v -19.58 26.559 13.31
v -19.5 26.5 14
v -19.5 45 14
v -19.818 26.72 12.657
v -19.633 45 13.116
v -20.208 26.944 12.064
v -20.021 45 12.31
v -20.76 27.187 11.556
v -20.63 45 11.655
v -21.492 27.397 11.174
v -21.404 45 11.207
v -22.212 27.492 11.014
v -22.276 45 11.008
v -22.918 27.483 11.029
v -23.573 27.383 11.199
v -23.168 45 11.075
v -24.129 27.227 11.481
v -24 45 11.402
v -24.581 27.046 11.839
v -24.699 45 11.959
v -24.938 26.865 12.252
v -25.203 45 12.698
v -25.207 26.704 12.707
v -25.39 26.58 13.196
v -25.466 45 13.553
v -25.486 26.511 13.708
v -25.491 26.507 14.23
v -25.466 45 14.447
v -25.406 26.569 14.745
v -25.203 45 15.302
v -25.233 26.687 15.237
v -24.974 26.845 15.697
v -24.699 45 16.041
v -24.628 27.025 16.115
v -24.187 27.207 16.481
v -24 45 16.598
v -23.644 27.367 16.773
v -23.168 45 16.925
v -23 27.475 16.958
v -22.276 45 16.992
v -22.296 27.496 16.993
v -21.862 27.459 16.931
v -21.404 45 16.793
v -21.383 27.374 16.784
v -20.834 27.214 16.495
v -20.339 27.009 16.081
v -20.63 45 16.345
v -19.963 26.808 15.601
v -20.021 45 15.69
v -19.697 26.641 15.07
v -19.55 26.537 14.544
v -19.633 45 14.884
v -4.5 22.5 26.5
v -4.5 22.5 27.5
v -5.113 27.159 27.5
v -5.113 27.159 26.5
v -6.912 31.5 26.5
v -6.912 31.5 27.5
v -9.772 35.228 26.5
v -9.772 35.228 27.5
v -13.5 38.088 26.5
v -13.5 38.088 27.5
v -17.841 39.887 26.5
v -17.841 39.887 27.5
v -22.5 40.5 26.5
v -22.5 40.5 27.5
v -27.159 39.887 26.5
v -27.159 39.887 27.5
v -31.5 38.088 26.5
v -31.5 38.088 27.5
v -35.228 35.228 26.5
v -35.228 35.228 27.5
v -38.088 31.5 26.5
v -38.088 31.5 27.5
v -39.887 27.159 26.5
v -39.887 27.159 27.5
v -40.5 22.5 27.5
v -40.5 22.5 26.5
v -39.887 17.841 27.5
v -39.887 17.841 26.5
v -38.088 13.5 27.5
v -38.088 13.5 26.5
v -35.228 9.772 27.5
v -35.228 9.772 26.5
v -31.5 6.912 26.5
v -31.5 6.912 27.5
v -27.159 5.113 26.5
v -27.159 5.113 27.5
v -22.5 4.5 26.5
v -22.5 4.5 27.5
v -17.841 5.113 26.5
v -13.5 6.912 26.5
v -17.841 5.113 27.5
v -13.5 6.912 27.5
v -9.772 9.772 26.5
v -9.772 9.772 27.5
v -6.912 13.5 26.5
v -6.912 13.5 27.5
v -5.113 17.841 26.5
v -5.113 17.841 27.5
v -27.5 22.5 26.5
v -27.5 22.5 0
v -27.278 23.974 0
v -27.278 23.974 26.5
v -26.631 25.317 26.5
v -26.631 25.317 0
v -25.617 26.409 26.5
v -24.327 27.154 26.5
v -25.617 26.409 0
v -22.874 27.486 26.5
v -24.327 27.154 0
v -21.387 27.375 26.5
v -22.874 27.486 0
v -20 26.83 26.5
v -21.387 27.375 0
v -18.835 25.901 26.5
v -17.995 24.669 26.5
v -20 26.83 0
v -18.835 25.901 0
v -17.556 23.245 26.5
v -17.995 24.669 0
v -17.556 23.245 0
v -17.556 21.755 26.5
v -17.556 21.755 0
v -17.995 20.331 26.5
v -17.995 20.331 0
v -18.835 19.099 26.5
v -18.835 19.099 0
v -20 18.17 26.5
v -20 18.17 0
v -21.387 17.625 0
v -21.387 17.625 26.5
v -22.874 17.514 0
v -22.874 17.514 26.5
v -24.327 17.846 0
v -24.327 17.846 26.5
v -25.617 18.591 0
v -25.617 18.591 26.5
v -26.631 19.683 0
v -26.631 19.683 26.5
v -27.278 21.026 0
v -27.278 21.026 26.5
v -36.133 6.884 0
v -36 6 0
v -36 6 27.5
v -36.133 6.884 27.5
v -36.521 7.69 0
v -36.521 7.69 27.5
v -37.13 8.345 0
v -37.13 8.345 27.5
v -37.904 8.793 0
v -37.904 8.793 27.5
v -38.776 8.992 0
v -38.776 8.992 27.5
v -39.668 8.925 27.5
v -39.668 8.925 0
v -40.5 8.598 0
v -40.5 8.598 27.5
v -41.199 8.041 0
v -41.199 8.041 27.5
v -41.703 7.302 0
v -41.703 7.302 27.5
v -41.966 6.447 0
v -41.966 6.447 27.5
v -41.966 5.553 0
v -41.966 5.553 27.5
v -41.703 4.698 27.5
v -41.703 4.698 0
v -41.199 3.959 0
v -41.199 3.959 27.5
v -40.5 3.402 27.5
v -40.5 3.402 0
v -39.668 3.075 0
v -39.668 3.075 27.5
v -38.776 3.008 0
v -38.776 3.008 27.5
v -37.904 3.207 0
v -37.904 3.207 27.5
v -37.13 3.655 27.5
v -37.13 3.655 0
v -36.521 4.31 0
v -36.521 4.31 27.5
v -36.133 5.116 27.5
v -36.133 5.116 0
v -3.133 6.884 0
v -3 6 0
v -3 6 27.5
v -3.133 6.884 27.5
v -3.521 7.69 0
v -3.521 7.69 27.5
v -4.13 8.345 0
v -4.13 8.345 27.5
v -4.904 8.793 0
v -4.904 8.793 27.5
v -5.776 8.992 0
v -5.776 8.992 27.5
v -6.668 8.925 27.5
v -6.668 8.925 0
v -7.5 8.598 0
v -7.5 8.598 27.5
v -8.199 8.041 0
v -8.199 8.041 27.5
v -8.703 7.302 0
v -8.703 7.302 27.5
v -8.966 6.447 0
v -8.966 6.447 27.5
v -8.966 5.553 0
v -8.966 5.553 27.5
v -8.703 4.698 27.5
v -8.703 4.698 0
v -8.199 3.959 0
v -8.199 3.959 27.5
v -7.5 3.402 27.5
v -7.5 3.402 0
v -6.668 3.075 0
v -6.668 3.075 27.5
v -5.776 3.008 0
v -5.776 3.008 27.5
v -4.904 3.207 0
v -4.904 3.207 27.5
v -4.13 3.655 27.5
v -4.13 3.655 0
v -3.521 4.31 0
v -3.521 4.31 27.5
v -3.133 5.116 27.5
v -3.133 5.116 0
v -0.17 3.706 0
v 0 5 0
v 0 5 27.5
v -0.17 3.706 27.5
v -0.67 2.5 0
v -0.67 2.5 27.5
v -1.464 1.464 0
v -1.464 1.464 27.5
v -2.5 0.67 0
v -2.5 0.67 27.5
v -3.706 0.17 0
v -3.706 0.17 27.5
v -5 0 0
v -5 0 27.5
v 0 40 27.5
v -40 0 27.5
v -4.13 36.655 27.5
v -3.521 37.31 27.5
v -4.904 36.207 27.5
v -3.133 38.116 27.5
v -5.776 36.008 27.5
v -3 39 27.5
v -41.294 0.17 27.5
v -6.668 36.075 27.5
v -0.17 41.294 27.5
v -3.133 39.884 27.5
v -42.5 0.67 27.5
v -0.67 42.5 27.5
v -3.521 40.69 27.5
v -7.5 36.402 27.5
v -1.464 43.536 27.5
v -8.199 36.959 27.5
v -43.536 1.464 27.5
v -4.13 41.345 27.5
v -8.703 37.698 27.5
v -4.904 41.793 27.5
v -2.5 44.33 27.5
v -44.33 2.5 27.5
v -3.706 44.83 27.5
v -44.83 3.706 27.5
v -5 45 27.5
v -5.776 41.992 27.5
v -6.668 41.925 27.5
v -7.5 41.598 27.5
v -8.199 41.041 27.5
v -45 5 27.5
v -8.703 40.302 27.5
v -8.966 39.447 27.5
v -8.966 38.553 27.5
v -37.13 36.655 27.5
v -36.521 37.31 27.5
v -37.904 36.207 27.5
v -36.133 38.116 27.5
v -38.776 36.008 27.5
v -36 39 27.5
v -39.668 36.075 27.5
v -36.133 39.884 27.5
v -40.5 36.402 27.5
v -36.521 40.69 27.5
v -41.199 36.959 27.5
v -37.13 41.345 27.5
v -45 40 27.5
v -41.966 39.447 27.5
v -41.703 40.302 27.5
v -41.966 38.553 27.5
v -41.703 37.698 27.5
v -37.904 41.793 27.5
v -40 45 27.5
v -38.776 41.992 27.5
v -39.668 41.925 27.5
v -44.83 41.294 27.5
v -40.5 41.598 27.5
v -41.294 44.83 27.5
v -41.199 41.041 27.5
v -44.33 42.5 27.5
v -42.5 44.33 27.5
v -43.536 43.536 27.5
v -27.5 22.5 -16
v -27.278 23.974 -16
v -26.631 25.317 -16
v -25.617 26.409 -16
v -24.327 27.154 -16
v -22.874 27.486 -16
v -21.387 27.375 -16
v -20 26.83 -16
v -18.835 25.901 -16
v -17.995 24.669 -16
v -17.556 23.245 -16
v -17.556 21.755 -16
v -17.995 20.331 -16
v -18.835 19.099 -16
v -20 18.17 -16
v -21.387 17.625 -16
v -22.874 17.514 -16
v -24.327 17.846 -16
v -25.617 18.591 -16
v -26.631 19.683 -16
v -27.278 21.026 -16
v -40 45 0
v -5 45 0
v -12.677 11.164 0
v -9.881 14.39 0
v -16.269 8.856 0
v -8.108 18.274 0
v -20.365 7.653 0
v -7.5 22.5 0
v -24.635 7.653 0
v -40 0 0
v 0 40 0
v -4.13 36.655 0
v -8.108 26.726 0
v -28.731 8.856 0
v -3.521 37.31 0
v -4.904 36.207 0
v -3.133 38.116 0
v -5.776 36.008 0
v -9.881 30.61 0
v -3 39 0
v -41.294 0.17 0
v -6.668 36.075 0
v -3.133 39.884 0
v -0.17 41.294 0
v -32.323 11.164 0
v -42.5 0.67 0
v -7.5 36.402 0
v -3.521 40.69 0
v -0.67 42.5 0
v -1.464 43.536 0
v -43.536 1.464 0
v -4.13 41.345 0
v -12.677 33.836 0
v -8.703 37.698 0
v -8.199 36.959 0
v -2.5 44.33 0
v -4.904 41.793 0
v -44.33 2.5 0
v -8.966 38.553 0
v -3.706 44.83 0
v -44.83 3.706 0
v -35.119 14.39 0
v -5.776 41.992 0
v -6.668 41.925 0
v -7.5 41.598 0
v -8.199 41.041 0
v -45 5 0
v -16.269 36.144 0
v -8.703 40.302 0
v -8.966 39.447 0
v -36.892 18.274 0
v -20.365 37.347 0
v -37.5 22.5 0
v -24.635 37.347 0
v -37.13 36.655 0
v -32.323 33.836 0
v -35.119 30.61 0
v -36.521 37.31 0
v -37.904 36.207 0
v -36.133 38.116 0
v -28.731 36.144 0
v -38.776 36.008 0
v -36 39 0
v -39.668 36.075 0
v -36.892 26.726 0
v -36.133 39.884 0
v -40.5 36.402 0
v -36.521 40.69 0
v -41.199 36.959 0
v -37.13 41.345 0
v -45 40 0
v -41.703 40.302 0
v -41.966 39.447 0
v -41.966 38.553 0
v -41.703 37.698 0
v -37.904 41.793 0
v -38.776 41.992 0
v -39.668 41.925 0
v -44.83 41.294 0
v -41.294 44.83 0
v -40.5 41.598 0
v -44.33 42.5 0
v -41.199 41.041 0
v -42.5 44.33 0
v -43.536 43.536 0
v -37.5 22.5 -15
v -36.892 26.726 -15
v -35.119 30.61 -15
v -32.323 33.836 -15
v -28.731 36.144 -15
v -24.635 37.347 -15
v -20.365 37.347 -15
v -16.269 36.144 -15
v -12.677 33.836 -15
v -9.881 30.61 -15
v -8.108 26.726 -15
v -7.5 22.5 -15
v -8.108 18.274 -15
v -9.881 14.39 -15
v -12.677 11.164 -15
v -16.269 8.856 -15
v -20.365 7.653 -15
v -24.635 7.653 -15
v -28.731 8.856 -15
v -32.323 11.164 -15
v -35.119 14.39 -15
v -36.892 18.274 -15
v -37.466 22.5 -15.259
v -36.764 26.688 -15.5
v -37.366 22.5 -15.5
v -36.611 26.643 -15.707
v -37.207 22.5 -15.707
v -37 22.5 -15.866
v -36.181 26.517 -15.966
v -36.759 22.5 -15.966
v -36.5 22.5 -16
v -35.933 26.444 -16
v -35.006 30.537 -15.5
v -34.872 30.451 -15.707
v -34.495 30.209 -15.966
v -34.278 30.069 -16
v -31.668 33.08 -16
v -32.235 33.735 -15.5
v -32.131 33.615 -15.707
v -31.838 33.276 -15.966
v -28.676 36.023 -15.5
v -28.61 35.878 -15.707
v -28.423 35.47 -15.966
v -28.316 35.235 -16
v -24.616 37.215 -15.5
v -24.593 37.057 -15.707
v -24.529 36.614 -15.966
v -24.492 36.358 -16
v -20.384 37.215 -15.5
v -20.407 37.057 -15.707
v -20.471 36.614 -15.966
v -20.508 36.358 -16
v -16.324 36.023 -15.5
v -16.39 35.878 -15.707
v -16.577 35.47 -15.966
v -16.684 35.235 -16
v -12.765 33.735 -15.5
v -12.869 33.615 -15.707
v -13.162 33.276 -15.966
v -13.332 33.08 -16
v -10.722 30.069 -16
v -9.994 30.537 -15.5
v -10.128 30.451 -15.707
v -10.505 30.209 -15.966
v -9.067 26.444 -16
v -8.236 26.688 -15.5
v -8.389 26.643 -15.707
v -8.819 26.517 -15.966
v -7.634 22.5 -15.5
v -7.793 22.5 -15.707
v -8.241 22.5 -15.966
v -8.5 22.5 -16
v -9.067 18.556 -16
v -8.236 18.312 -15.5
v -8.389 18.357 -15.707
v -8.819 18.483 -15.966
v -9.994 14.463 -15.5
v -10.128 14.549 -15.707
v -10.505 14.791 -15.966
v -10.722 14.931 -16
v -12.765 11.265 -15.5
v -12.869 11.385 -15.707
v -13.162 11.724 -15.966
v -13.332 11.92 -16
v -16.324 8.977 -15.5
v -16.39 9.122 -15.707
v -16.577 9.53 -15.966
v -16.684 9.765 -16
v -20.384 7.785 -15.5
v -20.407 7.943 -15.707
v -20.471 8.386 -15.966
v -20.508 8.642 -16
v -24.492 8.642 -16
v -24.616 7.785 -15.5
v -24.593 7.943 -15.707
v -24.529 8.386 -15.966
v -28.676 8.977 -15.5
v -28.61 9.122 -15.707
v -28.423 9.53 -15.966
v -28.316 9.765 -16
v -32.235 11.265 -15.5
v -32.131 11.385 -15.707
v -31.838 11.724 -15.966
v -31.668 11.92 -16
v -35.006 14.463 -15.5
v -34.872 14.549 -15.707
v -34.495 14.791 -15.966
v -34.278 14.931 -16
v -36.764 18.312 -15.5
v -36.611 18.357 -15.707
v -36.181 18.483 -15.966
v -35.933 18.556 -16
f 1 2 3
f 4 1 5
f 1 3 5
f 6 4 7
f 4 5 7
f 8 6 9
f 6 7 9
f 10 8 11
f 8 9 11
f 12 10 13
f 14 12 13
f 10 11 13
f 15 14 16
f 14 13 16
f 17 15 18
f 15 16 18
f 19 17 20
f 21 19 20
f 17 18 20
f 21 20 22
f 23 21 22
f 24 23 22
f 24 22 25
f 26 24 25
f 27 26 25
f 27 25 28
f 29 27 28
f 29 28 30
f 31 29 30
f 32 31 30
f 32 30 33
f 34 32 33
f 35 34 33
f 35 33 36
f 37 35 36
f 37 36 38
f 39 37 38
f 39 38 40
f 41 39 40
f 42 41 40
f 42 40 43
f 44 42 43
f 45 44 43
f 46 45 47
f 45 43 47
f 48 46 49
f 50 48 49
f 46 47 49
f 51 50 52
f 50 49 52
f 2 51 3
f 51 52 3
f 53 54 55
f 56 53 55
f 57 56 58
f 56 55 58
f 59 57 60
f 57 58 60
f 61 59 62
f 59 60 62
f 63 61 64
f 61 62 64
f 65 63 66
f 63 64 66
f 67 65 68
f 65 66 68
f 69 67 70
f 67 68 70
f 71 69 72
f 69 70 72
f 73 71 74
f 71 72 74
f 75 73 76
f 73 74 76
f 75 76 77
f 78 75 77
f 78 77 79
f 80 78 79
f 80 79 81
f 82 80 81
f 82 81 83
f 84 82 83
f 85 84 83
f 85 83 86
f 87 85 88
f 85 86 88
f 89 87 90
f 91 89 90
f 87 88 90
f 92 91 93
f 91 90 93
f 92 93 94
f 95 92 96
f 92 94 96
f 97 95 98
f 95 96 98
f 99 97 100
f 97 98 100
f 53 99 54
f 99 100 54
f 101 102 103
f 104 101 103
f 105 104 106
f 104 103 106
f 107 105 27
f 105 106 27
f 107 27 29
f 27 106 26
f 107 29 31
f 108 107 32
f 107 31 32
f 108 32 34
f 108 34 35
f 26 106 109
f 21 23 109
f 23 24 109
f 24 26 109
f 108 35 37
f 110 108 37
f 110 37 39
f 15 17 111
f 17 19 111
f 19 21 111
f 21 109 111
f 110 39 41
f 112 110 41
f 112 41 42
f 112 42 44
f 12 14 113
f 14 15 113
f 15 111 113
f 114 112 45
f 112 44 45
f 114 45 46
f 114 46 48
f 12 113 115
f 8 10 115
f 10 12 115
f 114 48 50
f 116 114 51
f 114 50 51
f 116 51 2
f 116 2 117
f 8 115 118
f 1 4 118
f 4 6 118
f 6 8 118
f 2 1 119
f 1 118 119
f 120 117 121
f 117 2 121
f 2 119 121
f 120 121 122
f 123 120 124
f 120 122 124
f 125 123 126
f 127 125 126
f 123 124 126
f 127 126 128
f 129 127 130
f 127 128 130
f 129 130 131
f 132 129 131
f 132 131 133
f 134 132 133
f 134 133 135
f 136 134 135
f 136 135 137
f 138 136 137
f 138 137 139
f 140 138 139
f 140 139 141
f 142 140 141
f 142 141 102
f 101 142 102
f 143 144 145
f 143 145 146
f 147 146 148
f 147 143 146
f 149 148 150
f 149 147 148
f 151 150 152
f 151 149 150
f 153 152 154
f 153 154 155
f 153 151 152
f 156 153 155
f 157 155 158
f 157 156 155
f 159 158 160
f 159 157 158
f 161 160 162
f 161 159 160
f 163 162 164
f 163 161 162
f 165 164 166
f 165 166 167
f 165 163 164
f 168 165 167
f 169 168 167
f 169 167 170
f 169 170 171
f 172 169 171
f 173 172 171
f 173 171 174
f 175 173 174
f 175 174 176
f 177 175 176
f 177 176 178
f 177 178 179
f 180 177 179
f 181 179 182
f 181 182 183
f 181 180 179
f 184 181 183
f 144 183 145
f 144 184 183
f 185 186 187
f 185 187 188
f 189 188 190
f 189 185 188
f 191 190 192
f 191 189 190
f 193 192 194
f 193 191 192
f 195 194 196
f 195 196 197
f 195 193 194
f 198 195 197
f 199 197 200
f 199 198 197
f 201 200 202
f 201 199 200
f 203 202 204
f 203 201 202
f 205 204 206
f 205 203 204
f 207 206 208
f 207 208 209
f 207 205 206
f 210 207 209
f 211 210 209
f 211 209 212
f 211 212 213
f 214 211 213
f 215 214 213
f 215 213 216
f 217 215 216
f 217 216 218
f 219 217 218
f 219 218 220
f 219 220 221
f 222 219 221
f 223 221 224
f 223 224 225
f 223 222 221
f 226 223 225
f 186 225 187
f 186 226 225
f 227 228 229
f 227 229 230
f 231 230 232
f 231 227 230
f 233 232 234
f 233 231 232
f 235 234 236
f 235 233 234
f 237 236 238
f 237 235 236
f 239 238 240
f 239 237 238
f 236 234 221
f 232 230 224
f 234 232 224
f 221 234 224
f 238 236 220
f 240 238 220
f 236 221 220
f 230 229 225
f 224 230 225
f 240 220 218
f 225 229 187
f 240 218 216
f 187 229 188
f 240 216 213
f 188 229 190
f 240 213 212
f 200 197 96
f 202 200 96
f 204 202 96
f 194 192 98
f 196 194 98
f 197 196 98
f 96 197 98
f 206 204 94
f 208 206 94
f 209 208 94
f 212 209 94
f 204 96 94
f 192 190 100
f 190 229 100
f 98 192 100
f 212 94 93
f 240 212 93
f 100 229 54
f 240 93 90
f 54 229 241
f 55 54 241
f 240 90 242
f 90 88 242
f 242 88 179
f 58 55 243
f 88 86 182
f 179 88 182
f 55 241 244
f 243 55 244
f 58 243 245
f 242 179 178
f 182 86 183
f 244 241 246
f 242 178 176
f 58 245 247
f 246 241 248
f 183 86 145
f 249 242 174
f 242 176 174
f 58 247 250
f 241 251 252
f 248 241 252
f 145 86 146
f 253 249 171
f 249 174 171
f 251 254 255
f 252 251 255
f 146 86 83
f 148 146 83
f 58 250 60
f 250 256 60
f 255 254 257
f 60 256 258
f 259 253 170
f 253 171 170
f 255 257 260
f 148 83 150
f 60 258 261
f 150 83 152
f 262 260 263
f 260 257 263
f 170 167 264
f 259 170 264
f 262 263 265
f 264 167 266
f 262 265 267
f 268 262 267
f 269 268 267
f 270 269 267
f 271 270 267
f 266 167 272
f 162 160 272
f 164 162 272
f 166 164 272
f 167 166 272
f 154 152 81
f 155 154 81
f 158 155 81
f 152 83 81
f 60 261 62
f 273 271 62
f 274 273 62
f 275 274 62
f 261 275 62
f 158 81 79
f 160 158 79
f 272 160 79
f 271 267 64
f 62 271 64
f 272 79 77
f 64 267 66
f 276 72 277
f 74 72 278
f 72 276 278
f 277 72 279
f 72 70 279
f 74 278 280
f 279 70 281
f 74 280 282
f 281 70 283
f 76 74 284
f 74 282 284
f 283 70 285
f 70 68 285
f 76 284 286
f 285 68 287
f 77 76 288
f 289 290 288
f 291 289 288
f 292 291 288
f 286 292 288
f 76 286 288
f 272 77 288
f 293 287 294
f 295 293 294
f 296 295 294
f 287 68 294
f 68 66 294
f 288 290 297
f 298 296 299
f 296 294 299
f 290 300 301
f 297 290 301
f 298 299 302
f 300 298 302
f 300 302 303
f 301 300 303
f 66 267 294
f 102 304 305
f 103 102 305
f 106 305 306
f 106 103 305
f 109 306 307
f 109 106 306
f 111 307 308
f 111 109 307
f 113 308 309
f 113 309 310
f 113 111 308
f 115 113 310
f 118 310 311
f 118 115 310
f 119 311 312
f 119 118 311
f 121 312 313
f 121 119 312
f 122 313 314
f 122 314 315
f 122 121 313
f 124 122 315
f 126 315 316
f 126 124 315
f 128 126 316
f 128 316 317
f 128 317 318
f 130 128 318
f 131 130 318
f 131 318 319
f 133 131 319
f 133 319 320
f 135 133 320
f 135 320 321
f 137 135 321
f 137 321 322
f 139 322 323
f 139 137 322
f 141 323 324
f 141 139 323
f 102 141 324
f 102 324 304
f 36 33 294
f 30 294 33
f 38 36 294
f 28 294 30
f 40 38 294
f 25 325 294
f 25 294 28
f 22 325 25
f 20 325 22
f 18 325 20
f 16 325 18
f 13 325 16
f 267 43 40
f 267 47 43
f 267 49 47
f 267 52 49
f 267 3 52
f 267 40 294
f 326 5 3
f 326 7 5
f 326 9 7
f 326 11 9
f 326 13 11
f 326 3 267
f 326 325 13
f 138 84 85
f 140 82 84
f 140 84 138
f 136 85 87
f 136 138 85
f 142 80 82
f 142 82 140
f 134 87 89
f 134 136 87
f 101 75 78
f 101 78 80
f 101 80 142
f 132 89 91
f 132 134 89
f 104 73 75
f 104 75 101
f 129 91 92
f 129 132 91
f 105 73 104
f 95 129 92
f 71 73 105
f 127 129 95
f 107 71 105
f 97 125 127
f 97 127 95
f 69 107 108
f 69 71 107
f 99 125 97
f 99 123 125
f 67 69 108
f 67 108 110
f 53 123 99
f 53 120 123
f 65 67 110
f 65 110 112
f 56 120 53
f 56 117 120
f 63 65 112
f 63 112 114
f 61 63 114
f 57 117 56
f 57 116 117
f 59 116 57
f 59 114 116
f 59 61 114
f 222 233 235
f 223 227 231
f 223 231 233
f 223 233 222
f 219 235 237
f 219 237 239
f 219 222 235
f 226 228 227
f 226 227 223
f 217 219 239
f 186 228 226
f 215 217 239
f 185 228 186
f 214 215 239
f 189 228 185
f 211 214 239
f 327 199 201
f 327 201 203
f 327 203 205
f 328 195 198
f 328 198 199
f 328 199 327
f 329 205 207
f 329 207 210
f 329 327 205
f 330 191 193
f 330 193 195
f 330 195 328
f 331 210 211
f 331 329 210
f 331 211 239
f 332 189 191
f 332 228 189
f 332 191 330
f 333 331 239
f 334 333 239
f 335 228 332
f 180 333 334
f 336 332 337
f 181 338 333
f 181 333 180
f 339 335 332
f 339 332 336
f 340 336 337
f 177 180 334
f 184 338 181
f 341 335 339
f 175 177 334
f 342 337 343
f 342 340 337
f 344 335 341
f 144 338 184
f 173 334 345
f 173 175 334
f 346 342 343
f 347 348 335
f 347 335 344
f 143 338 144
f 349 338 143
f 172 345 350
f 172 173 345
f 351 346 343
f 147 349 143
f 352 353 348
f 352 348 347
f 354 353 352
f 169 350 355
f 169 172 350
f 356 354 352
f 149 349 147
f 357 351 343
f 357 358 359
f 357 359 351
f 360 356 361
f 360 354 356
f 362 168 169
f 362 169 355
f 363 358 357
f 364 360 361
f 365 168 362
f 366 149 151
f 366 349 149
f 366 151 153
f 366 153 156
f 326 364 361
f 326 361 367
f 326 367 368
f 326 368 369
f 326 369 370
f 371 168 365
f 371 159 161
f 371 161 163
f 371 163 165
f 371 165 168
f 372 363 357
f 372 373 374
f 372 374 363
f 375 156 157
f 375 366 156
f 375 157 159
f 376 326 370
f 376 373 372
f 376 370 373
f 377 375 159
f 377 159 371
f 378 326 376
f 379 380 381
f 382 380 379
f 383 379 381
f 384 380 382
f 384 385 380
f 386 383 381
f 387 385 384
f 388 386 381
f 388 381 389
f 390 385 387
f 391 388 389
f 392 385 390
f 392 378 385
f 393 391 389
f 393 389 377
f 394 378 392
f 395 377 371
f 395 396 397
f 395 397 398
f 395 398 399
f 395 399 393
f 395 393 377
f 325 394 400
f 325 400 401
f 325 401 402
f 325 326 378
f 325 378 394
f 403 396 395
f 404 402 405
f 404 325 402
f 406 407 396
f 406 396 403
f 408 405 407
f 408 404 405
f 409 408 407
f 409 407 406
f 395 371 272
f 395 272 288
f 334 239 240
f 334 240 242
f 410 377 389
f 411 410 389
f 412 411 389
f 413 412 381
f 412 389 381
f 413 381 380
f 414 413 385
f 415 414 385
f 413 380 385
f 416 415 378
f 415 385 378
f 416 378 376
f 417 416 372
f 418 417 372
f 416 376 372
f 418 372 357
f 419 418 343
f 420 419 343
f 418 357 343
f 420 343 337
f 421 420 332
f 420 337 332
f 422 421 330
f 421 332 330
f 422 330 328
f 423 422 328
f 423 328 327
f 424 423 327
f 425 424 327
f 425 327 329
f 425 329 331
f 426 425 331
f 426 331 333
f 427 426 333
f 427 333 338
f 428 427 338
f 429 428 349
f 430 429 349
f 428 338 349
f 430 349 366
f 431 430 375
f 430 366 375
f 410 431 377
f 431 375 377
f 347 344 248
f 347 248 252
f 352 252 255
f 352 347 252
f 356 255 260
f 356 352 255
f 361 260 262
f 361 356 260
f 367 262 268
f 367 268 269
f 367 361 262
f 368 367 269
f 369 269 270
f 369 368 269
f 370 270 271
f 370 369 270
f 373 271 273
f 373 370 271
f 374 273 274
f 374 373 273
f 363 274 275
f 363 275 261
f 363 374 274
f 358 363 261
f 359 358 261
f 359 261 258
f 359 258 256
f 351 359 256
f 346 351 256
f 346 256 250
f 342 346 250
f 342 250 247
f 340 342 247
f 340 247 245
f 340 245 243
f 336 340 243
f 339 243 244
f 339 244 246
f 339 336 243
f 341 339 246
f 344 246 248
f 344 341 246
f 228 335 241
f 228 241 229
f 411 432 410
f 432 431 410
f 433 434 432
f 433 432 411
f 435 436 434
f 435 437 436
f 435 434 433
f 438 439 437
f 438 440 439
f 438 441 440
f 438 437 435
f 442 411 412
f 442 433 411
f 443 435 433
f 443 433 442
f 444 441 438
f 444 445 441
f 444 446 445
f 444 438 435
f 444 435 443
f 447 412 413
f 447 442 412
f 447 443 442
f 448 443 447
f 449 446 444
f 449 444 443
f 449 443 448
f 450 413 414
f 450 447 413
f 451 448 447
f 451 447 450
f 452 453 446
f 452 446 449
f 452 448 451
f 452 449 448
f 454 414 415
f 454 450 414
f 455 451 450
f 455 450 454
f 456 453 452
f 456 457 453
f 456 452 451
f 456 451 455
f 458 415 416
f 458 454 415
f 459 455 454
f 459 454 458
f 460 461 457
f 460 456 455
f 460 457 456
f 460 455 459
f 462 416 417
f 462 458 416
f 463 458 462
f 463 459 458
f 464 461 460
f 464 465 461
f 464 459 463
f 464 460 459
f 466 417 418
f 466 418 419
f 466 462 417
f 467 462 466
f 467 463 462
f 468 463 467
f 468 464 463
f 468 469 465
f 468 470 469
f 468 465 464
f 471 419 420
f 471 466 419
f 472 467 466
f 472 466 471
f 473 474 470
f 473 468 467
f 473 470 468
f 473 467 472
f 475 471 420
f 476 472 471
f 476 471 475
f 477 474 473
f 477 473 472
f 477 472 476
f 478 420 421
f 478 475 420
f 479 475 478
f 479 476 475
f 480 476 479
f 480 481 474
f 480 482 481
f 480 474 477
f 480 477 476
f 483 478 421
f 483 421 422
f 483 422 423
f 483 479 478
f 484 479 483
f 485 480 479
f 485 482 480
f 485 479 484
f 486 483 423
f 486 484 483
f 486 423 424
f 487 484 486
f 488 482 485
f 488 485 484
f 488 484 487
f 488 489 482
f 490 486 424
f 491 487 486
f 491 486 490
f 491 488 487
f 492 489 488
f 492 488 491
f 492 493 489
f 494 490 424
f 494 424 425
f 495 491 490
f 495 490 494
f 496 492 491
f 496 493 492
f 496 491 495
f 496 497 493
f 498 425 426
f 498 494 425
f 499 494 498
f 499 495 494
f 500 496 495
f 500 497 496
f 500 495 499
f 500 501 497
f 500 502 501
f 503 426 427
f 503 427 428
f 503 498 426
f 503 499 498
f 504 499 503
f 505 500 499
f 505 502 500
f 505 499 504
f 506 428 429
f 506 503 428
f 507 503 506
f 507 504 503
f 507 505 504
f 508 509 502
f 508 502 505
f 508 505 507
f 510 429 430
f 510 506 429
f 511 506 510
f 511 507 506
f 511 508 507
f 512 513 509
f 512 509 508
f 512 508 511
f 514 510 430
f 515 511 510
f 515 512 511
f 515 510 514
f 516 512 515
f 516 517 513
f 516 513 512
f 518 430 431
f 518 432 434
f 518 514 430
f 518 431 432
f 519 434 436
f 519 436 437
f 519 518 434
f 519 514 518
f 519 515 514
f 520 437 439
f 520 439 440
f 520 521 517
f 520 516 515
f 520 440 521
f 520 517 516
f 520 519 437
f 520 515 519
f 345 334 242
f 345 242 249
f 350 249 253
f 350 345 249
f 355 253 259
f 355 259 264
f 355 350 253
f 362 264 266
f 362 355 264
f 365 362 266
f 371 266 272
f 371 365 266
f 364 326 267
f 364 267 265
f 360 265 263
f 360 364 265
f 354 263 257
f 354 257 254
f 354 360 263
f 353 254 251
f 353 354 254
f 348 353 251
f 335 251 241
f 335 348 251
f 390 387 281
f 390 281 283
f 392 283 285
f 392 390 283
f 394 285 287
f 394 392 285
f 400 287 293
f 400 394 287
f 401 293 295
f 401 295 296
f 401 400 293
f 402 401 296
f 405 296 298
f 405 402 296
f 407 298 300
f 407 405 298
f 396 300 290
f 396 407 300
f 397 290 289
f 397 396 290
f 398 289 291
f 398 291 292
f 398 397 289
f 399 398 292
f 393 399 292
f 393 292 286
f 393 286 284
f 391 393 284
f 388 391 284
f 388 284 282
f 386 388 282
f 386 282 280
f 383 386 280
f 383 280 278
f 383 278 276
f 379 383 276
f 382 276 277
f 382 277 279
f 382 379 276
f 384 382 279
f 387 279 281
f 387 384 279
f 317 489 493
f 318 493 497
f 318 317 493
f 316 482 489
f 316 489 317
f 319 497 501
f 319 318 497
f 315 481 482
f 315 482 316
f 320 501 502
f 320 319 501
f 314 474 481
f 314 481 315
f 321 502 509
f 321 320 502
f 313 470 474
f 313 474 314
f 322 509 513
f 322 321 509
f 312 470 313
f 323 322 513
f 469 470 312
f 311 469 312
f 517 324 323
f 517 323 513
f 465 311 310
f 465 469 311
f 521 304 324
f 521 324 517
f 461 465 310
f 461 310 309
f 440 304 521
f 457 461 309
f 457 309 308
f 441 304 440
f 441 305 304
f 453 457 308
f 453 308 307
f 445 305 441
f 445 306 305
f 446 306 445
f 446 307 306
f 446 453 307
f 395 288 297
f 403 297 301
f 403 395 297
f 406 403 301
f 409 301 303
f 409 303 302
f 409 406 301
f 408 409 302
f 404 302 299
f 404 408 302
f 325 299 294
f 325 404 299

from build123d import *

# Parameters (mm, degrees)
SKETCH1_R           = 3
BOSS_EXTRUDE1_DEPTH = 27.5
SKETCH3_R           = 18
CUT_EXTRUDE1_DEPTH  = 1
SKETCH4_R           = 5
CUT_EXTRUDE2_DEPTH  = 28.5
SKETCH5_R           = 15
SKETCH5_R_2         = 5
BOSS_EXTRUDE2_DEPTH = 16
FILLET1_R           = 1
CUT_EXTRUDE3_REACH  = 47
SKETCH6_R           = 3


with BuildPart() as part:
    # Sketch1 → Boss-Extrude1 (new body)
    with BuildSketch(Plane.XY):
        with BuildLine():
            Line((0, 40), (0, 5))
            ThreePointArc((0, 5), (-1.464466094, 1.464466094), (-5, 0))
            Line((-5, 0), (-40, 0))
            ThreePointArc((-40, 0), (-43.535533906, 1.464466094), (-45, 5))
            Line((-45, 5), (-45, 40))
            ThreePointArc((-45, 40), (-43.535533906, 43.535533906), (-40, 45))
            Line((-40, 45), (-5, 45))
            ThreePointArc((-5, 45), (-1.464466094, 43.535533906), (0, 40))
        make_face()
        with Locations((-6, 39)):
            Circle(SKETCH1_R, mode=Mode.SUBTRACT)
        with Locations((-6, 6)):
            Circle(SKETCH1_R, mode=Mode.SUBTRACT)
        with Locations((-39, 6)):
            Circle(SKETCH1_R, mode=Mode.SUBTRACT)
        with Locations((-39, 39)):
            Circle(SKETCH1_R, mode=Mode.SUBTRACT)
    extrude(amount=BOSS_EXTRUDE1_DEPTH)

    # Sketch3 → Cut-Extrude1 (cut)
    with BuildSketch(Plane.XY.offset(27.5)):
        with Locations((-22.5, 22.5)):
            Circle(SKETCH3_R)
    extrude(amount=-CUT_EXTRUDE1_DEPTH, mode=Mode.SUBTRACT)

    # Sketch4 → Cut-Extrude2 (cut, through all)
    with BuildSketch(Plane(origin=(0, 0, 0), x_dir=(-1, 0, 0), z_dir=(0, 0, -1))):
        with Locations((22.5, 22.5)):
            Circle(SKETCH4_R)
    extrude(amount=-CUT_EXTRUDE2_DEPTH, mode=Mode.SUBTRACT)

    # Sketch5 → Boss-Extrude2 (add)
    with BuildSketch(Plane(origin=(0, 0, 0), x_dir=(-1, 0, 0), z_dir=(0, 0, -1))):
        with Locations((22.5, 22.5)):
            Circle(SKETCH5_R)
        with Locations((22.5, 22.5)):
            Circle(SKETCH5_R_2, mode=Mode.SUBTRACT)
    extrude(amount=BOSS_EXTRUDE2_DEPTH)

    # Fillet1
    fillet1_edges = [part.edges().sort_by_distance(p)[0] for p in [
        (-7.5, 22.5, -16),
    ]]
    fillet(fillet1_edges, radius=FILLET1_R)

    # Sketch6 → Cut-Extrude3 (cut, up to next)
    with BuildSketch(Plane(origin=(0, 45, 0), x_dir=(1, 0, 0), z_dir=(0, 1, 0)), mode=Mode.PRIVATE) as cut_extrude3_sk1:
        with Locations((-22.5, -14)):
            Circle(SKETCH6_R)
    cut_extrude3_tool1 = extrude(cut_extrude3_sk1.sketch, amount=-CUT_EXTRUDE3_REACH, mode=Mode.PRIVATE) & part.part
    add(cut_extrude3_tool1.solids().sort_by_distance((-22.5, 45, 14))[0], mode=Mode.SUBTRACT)


solid = part.part
